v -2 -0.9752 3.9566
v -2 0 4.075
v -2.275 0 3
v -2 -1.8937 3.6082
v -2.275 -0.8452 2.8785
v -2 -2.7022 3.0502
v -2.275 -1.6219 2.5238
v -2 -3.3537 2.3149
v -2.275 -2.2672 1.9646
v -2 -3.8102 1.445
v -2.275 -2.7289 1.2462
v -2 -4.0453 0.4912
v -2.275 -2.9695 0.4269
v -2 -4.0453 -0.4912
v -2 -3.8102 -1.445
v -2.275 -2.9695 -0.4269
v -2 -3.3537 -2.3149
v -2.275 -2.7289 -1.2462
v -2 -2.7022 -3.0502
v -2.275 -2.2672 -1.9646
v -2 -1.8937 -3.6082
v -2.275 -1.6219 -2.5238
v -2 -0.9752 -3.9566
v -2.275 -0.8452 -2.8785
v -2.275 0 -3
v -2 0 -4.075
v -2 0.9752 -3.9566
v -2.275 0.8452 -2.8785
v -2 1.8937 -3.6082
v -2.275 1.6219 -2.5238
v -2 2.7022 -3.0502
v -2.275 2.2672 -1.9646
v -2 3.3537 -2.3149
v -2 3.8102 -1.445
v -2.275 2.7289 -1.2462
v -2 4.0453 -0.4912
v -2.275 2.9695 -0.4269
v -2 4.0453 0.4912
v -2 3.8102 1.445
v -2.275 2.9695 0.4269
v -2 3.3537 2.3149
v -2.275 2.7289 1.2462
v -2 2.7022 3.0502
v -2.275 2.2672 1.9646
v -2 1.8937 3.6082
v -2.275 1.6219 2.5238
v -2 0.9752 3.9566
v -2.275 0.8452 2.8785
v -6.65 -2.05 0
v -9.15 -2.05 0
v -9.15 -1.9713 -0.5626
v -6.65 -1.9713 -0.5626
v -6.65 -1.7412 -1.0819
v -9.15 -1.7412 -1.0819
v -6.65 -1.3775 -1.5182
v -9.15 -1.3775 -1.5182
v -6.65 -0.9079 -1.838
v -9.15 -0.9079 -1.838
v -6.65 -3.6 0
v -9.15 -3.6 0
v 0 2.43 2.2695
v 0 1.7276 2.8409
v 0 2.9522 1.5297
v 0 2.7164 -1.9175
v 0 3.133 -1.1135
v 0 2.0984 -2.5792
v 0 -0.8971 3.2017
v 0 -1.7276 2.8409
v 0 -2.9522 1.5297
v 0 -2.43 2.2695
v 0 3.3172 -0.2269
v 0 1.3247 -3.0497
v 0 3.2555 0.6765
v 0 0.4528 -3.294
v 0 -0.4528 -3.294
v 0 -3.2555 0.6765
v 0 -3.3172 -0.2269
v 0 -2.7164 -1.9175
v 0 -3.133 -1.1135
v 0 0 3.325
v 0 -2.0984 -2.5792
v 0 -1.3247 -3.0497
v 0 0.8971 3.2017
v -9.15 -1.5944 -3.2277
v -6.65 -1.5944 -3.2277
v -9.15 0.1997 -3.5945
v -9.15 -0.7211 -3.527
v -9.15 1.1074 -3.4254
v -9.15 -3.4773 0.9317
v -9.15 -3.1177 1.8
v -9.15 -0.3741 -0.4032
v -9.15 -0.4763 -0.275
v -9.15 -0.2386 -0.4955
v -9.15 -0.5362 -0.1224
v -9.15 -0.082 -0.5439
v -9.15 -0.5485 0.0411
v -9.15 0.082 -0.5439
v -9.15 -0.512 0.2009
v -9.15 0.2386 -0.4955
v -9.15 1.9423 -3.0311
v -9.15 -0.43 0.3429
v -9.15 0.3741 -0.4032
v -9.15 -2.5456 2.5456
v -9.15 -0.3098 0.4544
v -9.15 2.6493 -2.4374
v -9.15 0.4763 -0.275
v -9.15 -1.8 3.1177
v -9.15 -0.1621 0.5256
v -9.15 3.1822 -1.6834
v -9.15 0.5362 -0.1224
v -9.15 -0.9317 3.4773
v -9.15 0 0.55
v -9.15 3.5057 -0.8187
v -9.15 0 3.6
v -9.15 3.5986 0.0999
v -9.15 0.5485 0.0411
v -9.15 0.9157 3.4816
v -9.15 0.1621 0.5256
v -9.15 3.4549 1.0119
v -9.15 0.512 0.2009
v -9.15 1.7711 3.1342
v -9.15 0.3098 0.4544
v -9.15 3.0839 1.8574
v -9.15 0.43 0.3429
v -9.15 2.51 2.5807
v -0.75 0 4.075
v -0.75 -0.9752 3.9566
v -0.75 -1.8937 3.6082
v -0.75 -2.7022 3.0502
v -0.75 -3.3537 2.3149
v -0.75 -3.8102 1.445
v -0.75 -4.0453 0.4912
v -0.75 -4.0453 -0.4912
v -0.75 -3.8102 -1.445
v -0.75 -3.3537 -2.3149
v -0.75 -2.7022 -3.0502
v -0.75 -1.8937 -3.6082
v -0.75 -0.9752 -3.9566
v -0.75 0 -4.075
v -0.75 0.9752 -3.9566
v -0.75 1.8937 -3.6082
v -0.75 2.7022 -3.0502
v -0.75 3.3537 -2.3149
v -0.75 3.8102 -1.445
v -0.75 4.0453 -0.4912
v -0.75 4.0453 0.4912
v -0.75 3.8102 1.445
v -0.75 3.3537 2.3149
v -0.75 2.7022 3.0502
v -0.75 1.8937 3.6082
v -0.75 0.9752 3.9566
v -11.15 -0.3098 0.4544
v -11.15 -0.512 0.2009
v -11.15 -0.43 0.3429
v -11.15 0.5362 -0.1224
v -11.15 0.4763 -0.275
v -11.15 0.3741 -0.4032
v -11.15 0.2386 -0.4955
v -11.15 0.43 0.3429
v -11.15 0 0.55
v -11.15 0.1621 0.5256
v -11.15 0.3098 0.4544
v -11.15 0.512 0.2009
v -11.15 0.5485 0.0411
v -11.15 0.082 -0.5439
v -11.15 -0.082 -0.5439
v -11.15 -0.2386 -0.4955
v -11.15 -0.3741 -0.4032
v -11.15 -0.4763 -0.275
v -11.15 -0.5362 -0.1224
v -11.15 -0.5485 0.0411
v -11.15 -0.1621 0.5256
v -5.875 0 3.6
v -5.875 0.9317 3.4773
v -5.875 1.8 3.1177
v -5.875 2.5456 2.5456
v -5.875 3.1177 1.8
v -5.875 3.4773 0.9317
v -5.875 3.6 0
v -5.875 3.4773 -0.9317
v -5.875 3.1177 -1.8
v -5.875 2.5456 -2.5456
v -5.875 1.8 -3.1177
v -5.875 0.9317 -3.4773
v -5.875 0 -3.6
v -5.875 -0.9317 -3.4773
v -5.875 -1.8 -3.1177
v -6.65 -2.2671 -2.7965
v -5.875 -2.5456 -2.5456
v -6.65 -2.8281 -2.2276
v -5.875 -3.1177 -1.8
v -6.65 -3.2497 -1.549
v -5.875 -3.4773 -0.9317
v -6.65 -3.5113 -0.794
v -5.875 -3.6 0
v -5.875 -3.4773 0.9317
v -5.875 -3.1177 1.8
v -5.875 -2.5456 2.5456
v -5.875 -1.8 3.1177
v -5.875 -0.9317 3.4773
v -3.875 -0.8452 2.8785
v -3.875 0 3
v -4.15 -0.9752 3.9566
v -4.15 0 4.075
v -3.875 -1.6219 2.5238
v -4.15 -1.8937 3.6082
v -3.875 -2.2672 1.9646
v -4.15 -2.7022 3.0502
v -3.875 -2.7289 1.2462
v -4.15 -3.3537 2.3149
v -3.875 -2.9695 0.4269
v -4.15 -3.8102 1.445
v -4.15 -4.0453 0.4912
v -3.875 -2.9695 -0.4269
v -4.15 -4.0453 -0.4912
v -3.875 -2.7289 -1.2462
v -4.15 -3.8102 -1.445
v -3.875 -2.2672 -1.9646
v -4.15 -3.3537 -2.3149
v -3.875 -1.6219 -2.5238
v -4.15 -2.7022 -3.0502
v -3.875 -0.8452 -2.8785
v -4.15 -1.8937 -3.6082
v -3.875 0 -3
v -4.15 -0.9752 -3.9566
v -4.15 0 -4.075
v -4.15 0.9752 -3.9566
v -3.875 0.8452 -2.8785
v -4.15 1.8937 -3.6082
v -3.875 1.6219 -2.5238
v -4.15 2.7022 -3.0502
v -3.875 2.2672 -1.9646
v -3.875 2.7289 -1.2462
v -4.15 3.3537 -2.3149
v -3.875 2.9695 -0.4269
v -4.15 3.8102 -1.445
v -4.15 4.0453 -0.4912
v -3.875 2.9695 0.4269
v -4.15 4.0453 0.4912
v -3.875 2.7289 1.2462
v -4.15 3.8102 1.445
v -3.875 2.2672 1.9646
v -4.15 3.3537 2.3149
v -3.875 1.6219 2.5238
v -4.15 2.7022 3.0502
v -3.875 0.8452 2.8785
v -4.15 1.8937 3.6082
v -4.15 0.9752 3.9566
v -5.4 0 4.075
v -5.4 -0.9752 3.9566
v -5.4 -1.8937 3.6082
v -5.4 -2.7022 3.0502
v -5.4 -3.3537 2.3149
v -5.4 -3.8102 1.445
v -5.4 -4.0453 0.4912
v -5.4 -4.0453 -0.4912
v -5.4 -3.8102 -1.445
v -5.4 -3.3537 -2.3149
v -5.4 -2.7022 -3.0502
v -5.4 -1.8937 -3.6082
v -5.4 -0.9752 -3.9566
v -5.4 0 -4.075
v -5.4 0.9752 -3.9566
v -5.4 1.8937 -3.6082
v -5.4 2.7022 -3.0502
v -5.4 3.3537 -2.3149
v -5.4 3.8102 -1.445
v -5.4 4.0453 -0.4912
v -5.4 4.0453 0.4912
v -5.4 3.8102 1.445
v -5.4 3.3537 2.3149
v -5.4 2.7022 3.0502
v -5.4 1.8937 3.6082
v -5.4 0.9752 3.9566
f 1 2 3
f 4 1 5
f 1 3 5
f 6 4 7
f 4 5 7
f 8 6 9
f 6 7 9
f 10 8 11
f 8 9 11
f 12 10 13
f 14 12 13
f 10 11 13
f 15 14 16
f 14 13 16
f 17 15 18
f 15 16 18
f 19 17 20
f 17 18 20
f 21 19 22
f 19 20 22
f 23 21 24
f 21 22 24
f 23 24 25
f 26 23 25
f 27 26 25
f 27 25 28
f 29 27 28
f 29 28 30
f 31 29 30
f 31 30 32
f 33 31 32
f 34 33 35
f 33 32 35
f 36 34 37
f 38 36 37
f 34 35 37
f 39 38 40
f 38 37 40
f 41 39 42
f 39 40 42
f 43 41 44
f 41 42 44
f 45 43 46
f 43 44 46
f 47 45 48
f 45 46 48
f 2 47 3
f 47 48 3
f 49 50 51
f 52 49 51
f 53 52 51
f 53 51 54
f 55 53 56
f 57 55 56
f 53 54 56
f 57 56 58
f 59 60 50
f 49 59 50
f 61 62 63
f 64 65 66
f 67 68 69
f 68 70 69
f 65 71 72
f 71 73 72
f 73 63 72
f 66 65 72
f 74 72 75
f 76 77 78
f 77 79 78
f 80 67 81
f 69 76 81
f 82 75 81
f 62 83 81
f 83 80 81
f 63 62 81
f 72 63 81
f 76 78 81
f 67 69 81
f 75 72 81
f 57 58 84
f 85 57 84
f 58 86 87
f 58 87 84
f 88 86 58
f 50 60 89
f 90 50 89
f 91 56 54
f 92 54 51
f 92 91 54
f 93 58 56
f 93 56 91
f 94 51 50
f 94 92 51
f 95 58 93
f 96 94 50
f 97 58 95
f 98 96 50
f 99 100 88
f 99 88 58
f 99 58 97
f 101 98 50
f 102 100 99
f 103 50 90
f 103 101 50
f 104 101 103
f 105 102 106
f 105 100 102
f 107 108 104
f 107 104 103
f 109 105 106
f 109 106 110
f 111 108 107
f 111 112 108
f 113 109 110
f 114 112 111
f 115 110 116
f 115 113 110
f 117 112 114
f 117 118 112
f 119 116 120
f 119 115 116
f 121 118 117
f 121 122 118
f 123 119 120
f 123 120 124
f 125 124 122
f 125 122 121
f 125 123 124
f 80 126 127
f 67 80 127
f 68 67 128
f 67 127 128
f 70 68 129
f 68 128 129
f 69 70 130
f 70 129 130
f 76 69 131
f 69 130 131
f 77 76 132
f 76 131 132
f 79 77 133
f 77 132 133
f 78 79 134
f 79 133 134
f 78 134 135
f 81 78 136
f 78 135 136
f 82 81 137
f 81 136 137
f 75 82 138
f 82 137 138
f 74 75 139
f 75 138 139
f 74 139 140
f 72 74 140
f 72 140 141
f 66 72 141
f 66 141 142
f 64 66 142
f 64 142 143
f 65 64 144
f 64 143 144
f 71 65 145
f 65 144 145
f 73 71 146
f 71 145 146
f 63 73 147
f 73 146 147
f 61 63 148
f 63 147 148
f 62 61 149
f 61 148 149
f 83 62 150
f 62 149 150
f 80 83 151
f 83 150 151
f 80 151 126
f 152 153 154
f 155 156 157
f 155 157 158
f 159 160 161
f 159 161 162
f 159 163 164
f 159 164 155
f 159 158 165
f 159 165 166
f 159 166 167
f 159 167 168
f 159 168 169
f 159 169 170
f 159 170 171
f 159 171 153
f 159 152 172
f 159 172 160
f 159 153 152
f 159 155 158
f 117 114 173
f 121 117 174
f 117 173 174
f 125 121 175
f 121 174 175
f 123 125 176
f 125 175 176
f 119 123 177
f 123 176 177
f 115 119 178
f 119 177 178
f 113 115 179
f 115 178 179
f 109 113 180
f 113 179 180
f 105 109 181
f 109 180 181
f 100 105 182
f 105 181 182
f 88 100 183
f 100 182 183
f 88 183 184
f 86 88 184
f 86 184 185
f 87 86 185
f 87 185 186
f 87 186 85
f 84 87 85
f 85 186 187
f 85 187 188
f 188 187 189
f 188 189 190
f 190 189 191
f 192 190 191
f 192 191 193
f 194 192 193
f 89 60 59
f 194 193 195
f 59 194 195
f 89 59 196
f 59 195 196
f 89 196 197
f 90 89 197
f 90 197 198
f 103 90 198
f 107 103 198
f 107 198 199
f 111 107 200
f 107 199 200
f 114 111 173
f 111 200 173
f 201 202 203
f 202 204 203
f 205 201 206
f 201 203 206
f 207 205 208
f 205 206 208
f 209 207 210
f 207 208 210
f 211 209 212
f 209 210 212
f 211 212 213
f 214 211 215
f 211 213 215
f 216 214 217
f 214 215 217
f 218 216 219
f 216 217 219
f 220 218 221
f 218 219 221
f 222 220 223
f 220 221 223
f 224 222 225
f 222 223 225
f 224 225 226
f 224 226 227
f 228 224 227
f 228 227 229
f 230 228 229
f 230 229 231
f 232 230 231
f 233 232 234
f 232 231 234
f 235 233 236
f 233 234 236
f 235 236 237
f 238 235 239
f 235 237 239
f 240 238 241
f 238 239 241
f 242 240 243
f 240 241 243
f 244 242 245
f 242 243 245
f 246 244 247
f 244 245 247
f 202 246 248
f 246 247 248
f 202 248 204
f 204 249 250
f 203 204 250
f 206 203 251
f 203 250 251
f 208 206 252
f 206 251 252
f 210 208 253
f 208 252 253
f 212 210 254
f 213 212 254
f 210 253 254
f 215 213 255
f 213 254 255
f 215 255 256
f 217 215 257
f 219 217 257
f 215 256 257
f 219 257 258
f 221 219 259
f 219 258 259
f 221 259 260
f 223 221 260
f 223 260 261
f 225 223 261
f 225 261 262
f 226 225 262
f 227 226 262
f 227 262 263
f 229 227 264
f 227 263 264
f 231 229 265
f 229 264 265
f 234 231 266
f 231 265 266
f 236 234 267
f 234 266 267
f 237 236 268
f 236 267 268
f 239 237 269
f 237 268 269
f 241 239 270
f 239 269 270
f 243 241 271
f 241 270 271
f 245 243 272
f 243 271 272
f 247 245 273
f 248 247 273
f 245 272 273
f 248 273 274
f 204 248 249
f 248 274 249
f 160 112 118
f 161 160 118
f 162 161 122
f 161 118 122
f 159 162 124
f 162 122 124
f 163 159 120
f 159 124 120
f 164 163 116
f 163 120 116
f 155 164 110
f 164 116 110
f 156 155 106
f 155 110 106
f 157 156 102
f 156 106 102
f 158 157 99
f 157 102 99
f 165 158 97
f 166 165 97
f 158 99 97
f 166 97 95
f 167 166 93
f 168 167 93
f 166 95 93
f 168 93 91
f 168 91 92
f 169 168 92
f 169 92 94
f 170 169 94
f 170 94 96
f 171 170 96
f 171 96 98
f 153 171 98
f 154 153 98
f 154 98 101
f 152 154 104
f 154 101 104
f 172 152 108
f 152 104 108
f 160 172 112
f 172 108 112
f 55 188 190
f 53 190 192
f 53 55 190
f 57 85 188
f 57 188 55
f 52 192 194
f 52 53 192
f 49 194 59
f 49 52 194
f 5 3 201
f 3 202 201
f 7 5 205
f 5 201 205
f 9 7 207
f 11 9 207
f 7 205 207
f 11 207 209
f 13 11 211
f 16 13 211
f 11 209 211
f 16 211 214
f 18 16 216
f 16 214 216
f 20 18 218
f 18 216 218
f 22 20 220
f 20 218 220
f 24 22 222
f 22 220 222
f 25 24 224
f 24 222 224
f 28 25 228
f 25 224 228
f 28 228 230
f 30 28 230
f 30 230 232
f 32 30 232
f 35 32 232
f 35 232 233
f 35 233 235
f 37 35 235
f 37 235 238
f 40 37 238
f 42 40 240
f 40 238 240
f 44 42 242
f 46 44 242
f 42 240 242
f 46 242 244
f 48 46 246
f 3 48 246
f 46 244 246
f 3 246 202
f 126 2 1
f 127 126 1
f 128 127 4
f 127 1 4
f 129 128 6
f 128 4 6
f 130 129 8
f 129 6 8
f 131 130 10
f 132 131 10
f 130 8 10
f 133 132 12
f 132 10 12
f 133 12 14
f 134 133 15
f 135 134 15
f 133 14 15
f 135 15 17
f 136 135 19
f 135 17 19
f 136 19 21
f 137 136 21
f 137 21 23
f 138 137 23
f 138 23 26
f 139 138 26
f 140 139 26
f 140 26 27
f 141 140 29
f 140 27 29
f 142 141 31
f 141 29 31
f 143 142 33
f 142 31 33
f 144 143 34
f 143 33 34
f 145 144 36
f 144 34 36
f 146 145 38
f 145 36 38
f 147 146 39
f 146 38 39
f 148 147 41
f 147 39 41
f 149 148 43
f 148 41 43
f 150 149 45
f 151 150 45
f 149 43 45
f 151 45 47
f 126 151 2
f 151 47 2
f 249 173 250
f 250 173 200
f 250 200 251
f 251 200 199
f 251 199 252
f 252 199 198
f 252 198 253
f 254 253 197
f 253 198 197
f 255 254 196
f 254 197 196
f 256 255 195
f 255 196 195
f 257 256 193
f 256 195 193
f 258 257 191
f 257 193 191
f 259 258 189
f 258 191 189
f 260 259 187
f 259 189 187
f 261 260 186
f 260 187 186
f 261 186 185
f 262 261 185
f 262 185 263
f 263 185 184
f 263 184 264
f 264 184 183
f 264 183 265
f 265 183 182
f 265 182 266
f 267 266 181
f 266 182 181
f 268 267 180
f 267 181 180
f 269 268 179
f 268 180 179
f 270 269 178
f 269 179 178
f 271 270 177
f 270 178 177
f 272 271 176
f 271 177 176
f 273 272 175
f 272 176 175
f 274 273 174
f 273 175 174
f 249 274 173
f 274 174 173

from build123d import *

# Parameters (mm, degrees)
CHAMFER1_SIZE            = 0.75
BOSS_EXTRUDE1_DEPTH      = 3
BOSS_EXTRUDE1_DEPTH_BACK = 1
SKETCH2_R                = 3.6
SKETCH3_R                = 0.55
BOSS_EXTRUDE2_DEPTH      = 2
CUT_EXTRUDE1_DEPTH       = 2.5


with BuildPart() as part:
    # Sketch1 → Revolve1 (revolve)
    with BuildSketch(Plane(origin=(0, 0, 0), x_dir=(1, 0, 0), z_dir=(0, 1, 0)), mode=Mode.PRIVATE) as revolve1_sk:
        Polygon((-4.15, 4.075), (-6.15, 4.075), (-6.15, 0), (0, 0), (0, 4.075), (-2, 4.075), (-2.275, 3), (-3.875, 3), align=None)
    revolve(revolve1_sk.sketch.rotate(Axis((-23.01300908, 0, 0), (1, 0, 0)), 180), axis=Axis((-23.01300908, 0, 0), (1, 0, 0)))

    # Chamfer1
    chamfer1_edges = [part.edges().sort_by_distance(p)[0] for p in [
        (-6.15, 0, -4.075),
        (0, 0, -4.075),
    ]]
    chamfer(chamfer1_edges, length=CHAMFER1_SIZE)

    # Sketch2 → Boss-Extrude1 (add, two sides: drawn at the far end of the back side and taken through both)
    with BuildSketch(Plane.ZY.offset(6.15).offset(-BOSS_EXTRUDE1_DEPTH_BACK)):
        Circle(SKETCH2_R)
    extrude(amount=BOSS_EXTRUDE1_DEPTH + BOSS_EXTRUDE1_DEPTH_BACK)

    # Sketch3 → Boss-Extrude2 (add)
    with BuildSketch(Plane.ZY.offset(9.15)):
        Circle(SKETCH3_R)
    extrude(amount=BOSS_EXTRUDE2_DEPTH)

    # Sketch4 → Cut-Extrude1 (cut)
    with BuildSketch(Plane.ZY.offset(9.15)):
        with BuildLine():
            Line((0, -3.6), (0, -2.05))
            ThreePointArc((0, -2.05), (-1.081944444, -1.741234108), (-1.837969336, -0.907947531))
            Line((-1.837969336, -0.907947531), (-3.227653469, -1.594444444))
            ThreePointArc((-3.227653469, -1.594444444), (-1.9, -3.05777697), (0, -3.6))
        make_face()
    extrude(amount=-CUT_EXTRUDE1_DEPTH, mode=Mode.SUBTRACT)


solid = part.part
